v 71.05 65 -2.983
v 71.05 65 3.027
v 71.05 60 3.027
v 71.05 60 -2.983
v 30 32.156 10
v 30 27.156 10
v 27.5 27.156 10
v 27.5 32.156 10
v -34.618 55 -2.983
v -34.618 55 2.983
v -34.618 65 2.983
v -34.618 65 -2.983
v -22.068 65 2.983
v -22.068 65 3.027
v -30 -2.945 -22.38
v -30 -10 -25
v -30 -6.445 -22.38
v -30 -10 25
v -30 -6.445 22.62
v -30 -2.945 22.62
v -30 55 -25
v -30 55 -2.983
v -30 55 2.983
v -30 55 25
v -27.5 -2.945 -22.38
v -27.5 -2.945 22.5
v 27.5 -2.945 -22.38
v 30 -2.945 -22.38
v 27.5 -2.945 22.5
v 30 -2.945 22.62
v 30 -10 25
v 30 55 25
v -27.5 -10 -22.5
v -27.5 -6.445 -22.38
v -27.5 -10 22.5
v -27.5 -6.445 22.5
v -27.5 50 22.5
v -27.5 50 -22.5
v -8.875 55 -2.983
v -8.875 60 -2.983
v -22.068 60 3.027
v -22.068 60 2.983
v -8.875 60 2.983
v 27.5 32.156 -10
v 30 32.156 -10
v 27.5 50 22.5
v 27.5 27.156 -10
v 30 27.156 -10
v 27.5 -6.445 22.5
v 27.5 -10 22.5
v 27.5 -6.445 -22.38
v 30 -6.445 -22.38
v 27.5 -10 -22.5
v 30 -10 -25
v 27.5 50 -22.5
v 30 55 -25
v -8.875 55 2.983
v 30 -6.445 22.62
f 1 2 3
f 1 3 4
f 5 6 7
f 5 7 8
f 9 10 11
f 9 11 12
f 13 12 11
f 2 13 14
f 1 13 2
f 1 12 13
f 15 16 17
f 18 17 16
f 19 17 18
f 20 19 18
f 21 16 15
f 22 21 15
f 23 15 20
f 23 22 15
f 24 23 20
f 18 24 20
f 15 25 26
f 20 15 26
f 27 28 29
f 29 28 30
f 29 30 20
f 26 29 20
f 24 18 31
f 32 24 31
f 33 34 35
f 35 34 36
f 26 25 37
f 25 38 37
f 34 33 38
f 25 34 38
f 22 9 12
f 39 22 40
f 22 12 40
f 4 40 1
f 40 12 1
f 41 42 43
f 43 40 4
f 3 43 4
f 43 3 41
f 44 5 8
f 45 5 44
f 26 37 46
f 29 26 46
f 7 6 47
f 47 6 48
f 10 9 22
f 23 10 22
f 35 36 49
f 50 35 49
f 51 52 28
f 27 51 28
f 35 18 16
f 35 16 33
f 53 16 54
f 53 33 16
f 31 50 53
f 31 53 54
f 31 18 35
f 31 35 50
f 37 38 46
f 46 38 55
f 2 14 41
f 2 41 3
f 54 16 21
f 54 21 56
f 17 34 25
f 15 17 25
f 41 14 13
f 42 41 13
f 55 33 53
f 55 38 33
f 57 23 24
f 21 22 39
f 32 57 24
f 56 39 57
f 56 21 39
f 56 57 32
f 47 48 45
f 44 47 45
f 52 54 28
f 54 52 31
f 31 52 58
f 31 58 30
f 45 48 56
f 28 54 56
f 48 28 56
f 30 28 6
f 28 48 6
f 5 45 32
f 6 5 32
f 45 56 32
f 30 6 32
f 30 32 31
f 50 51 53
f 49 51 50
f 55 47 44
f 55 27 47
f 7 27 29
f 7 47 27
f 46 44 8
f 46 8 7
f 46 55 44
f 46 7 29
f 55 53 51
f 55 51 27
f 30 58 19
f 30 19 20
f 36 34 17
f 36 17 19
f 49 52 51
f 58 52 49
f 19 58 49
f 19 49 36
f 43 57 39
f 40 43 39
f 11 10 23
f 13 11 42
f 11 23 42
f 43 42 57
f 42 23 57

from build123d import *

# Parameters (mm, degrees)
SKETCH1_W               = 60
SKETCH1_H               = 50
SKETCH1_W_2             = 55
SKETCH1_H_2             = 45
BOSS_EXTRUDE1_DEPTH     = 50
SKETCH2_W               = 60
SKETCH2_H               = 50
BOSS_EXTRUDE2_DEPTH     = 5
CUT_EXTRUDE1_REACH      = 87.147
SKETCH3_W               = 20
SKETCH3_H               = 5
SKETCH4_W               = 25.74299971
SKETCH4_H               = 5.966870814
BOSS_EXTRUDE5_DEPTH     = 10
SKETCH8_W               = 93.117720322
SKETCH8_H               = 6.00994507
BOSS_EXTRUDE6_DEPTH     = 5
SKETCH10_W              = 60
SKETCH10_H              = 50
SKETCH10_W_2            = 55
SKETCH10_H_2            = 45
BOSS_EXTRUDE7_DEPTH     = 10
CUT_EXTRUDE2_DEPTH      = 123.723278076
CUT_EXTRUDE2_DEPTH_BACK = 123.723278076
SKETCH11_W              = 45
SKETCH11_H              = 3.5


with BuildPart() as part:
    # Sketch1 → Boss-Extrude1 (new body)
    with BuildSketch(Plane(origin=(0, 0, 0), x_dir=(1, 0, 0), z_dir=(0, 1, 0))):
        Rectangle(SKETCH1_W, SKETCH1_H)
        Rectangle(SKETCH1_W_2, SKETCH1_H_2, mode=Mode.SUBTRACT)
    extrude(amount=BOSS_EXTRUDE1_DEPTH)

    # Sketch2 → Boss-Extrude2 (add)
    with BuildSketch(Plane(origin=(0, 50, 0), x_dir=(1, 0, 0), z_dir=(0, 1, 0))):
        Rectangle(SKETCH2_W, SKETCH2_H)
    extrude(amount=BOSS_EXTRUDE2_DEPTH)

    # Sketch3 → Cut-Extrude1 (cut, up to next)
    with BuildSketch(Plane(origin=(30, 0, 0), x_dir=(0, 0, -1), z_dir=(1, 0, 0)), mode=Mode.PRIVATE) as cut_extrude1_sk1:
        with Locations((0, 29.65624639)):
            Rectangle(SKETCH3_W, SKETCH3_H)
    cut_extrude1_tool1 = extrude(cut_extrude1_sk1.sketch, amount=-CUT_EXTRUDE1_REACH, mode=Mode.PRIVATE) & part.part
    add(cut_extrude1_tool1.solids().sort_by_distance((30, 29.656246, 0))[0], mode=Mode.SUBTRACT)

    # Sketch4 → Boss-Extrude5 (add)
    with BuildSketch(Plane(origin=(0, 55, 0), x_dir=(1, 0, 0), z_dir=(0, 1, 0))):
        with Locations((-21.74634114, 0)):
            Rectangle(SKETCH4_W, SKETCH4_H)
    extrude(amount=BOSS_EXTRUDE5_DEPTH)

    # Sketch8 → Boss-Extrude6 (add)
    with BuildSketch(Plane(origin=(0, 65, 0), x_dir=(1, 0, 0), z_dir=(0, 1, 0))):
        with Locations((24.490647417, -0.021537128)):
            Rectangle(SKETCH8_W, SKETCH8_H)
    extrude(amount=-BOSS_EXTRUDE6_DEPTH)

    # Sketch10 → Boss-Extrude7 (add)
    with BuildSketch(Plane.XZ):
        Rectangle(SKETCH10_W, SKETCH10_H)
        Rectangle(SKETCH10_W_2, SKETCH10_H_2, mode=Mode.SUBTRACT)
    extrude(amount=BOSS_EXTRUDE7_DEPTH)

    # Sketch11 → Cut-Extrude2 (cut, two sides: drawn at the far end of the back side and taken through both)
    with BuildSketch(Plane.ZY.offset(30).offset(-CUT_EXTRUDE2_DEPTH_BACK)):
        with Locations((0.11957715, -4.695440094)):
            Rectangle(SKETCH11_W, SKETCH11_H)
    extrude(amount=CUT_EXTRUDE2_DEPTH + CUT_EXTRUDE2_DEPTH_BACK, mode=Mode.SUBTRACT)


solid = part.part
